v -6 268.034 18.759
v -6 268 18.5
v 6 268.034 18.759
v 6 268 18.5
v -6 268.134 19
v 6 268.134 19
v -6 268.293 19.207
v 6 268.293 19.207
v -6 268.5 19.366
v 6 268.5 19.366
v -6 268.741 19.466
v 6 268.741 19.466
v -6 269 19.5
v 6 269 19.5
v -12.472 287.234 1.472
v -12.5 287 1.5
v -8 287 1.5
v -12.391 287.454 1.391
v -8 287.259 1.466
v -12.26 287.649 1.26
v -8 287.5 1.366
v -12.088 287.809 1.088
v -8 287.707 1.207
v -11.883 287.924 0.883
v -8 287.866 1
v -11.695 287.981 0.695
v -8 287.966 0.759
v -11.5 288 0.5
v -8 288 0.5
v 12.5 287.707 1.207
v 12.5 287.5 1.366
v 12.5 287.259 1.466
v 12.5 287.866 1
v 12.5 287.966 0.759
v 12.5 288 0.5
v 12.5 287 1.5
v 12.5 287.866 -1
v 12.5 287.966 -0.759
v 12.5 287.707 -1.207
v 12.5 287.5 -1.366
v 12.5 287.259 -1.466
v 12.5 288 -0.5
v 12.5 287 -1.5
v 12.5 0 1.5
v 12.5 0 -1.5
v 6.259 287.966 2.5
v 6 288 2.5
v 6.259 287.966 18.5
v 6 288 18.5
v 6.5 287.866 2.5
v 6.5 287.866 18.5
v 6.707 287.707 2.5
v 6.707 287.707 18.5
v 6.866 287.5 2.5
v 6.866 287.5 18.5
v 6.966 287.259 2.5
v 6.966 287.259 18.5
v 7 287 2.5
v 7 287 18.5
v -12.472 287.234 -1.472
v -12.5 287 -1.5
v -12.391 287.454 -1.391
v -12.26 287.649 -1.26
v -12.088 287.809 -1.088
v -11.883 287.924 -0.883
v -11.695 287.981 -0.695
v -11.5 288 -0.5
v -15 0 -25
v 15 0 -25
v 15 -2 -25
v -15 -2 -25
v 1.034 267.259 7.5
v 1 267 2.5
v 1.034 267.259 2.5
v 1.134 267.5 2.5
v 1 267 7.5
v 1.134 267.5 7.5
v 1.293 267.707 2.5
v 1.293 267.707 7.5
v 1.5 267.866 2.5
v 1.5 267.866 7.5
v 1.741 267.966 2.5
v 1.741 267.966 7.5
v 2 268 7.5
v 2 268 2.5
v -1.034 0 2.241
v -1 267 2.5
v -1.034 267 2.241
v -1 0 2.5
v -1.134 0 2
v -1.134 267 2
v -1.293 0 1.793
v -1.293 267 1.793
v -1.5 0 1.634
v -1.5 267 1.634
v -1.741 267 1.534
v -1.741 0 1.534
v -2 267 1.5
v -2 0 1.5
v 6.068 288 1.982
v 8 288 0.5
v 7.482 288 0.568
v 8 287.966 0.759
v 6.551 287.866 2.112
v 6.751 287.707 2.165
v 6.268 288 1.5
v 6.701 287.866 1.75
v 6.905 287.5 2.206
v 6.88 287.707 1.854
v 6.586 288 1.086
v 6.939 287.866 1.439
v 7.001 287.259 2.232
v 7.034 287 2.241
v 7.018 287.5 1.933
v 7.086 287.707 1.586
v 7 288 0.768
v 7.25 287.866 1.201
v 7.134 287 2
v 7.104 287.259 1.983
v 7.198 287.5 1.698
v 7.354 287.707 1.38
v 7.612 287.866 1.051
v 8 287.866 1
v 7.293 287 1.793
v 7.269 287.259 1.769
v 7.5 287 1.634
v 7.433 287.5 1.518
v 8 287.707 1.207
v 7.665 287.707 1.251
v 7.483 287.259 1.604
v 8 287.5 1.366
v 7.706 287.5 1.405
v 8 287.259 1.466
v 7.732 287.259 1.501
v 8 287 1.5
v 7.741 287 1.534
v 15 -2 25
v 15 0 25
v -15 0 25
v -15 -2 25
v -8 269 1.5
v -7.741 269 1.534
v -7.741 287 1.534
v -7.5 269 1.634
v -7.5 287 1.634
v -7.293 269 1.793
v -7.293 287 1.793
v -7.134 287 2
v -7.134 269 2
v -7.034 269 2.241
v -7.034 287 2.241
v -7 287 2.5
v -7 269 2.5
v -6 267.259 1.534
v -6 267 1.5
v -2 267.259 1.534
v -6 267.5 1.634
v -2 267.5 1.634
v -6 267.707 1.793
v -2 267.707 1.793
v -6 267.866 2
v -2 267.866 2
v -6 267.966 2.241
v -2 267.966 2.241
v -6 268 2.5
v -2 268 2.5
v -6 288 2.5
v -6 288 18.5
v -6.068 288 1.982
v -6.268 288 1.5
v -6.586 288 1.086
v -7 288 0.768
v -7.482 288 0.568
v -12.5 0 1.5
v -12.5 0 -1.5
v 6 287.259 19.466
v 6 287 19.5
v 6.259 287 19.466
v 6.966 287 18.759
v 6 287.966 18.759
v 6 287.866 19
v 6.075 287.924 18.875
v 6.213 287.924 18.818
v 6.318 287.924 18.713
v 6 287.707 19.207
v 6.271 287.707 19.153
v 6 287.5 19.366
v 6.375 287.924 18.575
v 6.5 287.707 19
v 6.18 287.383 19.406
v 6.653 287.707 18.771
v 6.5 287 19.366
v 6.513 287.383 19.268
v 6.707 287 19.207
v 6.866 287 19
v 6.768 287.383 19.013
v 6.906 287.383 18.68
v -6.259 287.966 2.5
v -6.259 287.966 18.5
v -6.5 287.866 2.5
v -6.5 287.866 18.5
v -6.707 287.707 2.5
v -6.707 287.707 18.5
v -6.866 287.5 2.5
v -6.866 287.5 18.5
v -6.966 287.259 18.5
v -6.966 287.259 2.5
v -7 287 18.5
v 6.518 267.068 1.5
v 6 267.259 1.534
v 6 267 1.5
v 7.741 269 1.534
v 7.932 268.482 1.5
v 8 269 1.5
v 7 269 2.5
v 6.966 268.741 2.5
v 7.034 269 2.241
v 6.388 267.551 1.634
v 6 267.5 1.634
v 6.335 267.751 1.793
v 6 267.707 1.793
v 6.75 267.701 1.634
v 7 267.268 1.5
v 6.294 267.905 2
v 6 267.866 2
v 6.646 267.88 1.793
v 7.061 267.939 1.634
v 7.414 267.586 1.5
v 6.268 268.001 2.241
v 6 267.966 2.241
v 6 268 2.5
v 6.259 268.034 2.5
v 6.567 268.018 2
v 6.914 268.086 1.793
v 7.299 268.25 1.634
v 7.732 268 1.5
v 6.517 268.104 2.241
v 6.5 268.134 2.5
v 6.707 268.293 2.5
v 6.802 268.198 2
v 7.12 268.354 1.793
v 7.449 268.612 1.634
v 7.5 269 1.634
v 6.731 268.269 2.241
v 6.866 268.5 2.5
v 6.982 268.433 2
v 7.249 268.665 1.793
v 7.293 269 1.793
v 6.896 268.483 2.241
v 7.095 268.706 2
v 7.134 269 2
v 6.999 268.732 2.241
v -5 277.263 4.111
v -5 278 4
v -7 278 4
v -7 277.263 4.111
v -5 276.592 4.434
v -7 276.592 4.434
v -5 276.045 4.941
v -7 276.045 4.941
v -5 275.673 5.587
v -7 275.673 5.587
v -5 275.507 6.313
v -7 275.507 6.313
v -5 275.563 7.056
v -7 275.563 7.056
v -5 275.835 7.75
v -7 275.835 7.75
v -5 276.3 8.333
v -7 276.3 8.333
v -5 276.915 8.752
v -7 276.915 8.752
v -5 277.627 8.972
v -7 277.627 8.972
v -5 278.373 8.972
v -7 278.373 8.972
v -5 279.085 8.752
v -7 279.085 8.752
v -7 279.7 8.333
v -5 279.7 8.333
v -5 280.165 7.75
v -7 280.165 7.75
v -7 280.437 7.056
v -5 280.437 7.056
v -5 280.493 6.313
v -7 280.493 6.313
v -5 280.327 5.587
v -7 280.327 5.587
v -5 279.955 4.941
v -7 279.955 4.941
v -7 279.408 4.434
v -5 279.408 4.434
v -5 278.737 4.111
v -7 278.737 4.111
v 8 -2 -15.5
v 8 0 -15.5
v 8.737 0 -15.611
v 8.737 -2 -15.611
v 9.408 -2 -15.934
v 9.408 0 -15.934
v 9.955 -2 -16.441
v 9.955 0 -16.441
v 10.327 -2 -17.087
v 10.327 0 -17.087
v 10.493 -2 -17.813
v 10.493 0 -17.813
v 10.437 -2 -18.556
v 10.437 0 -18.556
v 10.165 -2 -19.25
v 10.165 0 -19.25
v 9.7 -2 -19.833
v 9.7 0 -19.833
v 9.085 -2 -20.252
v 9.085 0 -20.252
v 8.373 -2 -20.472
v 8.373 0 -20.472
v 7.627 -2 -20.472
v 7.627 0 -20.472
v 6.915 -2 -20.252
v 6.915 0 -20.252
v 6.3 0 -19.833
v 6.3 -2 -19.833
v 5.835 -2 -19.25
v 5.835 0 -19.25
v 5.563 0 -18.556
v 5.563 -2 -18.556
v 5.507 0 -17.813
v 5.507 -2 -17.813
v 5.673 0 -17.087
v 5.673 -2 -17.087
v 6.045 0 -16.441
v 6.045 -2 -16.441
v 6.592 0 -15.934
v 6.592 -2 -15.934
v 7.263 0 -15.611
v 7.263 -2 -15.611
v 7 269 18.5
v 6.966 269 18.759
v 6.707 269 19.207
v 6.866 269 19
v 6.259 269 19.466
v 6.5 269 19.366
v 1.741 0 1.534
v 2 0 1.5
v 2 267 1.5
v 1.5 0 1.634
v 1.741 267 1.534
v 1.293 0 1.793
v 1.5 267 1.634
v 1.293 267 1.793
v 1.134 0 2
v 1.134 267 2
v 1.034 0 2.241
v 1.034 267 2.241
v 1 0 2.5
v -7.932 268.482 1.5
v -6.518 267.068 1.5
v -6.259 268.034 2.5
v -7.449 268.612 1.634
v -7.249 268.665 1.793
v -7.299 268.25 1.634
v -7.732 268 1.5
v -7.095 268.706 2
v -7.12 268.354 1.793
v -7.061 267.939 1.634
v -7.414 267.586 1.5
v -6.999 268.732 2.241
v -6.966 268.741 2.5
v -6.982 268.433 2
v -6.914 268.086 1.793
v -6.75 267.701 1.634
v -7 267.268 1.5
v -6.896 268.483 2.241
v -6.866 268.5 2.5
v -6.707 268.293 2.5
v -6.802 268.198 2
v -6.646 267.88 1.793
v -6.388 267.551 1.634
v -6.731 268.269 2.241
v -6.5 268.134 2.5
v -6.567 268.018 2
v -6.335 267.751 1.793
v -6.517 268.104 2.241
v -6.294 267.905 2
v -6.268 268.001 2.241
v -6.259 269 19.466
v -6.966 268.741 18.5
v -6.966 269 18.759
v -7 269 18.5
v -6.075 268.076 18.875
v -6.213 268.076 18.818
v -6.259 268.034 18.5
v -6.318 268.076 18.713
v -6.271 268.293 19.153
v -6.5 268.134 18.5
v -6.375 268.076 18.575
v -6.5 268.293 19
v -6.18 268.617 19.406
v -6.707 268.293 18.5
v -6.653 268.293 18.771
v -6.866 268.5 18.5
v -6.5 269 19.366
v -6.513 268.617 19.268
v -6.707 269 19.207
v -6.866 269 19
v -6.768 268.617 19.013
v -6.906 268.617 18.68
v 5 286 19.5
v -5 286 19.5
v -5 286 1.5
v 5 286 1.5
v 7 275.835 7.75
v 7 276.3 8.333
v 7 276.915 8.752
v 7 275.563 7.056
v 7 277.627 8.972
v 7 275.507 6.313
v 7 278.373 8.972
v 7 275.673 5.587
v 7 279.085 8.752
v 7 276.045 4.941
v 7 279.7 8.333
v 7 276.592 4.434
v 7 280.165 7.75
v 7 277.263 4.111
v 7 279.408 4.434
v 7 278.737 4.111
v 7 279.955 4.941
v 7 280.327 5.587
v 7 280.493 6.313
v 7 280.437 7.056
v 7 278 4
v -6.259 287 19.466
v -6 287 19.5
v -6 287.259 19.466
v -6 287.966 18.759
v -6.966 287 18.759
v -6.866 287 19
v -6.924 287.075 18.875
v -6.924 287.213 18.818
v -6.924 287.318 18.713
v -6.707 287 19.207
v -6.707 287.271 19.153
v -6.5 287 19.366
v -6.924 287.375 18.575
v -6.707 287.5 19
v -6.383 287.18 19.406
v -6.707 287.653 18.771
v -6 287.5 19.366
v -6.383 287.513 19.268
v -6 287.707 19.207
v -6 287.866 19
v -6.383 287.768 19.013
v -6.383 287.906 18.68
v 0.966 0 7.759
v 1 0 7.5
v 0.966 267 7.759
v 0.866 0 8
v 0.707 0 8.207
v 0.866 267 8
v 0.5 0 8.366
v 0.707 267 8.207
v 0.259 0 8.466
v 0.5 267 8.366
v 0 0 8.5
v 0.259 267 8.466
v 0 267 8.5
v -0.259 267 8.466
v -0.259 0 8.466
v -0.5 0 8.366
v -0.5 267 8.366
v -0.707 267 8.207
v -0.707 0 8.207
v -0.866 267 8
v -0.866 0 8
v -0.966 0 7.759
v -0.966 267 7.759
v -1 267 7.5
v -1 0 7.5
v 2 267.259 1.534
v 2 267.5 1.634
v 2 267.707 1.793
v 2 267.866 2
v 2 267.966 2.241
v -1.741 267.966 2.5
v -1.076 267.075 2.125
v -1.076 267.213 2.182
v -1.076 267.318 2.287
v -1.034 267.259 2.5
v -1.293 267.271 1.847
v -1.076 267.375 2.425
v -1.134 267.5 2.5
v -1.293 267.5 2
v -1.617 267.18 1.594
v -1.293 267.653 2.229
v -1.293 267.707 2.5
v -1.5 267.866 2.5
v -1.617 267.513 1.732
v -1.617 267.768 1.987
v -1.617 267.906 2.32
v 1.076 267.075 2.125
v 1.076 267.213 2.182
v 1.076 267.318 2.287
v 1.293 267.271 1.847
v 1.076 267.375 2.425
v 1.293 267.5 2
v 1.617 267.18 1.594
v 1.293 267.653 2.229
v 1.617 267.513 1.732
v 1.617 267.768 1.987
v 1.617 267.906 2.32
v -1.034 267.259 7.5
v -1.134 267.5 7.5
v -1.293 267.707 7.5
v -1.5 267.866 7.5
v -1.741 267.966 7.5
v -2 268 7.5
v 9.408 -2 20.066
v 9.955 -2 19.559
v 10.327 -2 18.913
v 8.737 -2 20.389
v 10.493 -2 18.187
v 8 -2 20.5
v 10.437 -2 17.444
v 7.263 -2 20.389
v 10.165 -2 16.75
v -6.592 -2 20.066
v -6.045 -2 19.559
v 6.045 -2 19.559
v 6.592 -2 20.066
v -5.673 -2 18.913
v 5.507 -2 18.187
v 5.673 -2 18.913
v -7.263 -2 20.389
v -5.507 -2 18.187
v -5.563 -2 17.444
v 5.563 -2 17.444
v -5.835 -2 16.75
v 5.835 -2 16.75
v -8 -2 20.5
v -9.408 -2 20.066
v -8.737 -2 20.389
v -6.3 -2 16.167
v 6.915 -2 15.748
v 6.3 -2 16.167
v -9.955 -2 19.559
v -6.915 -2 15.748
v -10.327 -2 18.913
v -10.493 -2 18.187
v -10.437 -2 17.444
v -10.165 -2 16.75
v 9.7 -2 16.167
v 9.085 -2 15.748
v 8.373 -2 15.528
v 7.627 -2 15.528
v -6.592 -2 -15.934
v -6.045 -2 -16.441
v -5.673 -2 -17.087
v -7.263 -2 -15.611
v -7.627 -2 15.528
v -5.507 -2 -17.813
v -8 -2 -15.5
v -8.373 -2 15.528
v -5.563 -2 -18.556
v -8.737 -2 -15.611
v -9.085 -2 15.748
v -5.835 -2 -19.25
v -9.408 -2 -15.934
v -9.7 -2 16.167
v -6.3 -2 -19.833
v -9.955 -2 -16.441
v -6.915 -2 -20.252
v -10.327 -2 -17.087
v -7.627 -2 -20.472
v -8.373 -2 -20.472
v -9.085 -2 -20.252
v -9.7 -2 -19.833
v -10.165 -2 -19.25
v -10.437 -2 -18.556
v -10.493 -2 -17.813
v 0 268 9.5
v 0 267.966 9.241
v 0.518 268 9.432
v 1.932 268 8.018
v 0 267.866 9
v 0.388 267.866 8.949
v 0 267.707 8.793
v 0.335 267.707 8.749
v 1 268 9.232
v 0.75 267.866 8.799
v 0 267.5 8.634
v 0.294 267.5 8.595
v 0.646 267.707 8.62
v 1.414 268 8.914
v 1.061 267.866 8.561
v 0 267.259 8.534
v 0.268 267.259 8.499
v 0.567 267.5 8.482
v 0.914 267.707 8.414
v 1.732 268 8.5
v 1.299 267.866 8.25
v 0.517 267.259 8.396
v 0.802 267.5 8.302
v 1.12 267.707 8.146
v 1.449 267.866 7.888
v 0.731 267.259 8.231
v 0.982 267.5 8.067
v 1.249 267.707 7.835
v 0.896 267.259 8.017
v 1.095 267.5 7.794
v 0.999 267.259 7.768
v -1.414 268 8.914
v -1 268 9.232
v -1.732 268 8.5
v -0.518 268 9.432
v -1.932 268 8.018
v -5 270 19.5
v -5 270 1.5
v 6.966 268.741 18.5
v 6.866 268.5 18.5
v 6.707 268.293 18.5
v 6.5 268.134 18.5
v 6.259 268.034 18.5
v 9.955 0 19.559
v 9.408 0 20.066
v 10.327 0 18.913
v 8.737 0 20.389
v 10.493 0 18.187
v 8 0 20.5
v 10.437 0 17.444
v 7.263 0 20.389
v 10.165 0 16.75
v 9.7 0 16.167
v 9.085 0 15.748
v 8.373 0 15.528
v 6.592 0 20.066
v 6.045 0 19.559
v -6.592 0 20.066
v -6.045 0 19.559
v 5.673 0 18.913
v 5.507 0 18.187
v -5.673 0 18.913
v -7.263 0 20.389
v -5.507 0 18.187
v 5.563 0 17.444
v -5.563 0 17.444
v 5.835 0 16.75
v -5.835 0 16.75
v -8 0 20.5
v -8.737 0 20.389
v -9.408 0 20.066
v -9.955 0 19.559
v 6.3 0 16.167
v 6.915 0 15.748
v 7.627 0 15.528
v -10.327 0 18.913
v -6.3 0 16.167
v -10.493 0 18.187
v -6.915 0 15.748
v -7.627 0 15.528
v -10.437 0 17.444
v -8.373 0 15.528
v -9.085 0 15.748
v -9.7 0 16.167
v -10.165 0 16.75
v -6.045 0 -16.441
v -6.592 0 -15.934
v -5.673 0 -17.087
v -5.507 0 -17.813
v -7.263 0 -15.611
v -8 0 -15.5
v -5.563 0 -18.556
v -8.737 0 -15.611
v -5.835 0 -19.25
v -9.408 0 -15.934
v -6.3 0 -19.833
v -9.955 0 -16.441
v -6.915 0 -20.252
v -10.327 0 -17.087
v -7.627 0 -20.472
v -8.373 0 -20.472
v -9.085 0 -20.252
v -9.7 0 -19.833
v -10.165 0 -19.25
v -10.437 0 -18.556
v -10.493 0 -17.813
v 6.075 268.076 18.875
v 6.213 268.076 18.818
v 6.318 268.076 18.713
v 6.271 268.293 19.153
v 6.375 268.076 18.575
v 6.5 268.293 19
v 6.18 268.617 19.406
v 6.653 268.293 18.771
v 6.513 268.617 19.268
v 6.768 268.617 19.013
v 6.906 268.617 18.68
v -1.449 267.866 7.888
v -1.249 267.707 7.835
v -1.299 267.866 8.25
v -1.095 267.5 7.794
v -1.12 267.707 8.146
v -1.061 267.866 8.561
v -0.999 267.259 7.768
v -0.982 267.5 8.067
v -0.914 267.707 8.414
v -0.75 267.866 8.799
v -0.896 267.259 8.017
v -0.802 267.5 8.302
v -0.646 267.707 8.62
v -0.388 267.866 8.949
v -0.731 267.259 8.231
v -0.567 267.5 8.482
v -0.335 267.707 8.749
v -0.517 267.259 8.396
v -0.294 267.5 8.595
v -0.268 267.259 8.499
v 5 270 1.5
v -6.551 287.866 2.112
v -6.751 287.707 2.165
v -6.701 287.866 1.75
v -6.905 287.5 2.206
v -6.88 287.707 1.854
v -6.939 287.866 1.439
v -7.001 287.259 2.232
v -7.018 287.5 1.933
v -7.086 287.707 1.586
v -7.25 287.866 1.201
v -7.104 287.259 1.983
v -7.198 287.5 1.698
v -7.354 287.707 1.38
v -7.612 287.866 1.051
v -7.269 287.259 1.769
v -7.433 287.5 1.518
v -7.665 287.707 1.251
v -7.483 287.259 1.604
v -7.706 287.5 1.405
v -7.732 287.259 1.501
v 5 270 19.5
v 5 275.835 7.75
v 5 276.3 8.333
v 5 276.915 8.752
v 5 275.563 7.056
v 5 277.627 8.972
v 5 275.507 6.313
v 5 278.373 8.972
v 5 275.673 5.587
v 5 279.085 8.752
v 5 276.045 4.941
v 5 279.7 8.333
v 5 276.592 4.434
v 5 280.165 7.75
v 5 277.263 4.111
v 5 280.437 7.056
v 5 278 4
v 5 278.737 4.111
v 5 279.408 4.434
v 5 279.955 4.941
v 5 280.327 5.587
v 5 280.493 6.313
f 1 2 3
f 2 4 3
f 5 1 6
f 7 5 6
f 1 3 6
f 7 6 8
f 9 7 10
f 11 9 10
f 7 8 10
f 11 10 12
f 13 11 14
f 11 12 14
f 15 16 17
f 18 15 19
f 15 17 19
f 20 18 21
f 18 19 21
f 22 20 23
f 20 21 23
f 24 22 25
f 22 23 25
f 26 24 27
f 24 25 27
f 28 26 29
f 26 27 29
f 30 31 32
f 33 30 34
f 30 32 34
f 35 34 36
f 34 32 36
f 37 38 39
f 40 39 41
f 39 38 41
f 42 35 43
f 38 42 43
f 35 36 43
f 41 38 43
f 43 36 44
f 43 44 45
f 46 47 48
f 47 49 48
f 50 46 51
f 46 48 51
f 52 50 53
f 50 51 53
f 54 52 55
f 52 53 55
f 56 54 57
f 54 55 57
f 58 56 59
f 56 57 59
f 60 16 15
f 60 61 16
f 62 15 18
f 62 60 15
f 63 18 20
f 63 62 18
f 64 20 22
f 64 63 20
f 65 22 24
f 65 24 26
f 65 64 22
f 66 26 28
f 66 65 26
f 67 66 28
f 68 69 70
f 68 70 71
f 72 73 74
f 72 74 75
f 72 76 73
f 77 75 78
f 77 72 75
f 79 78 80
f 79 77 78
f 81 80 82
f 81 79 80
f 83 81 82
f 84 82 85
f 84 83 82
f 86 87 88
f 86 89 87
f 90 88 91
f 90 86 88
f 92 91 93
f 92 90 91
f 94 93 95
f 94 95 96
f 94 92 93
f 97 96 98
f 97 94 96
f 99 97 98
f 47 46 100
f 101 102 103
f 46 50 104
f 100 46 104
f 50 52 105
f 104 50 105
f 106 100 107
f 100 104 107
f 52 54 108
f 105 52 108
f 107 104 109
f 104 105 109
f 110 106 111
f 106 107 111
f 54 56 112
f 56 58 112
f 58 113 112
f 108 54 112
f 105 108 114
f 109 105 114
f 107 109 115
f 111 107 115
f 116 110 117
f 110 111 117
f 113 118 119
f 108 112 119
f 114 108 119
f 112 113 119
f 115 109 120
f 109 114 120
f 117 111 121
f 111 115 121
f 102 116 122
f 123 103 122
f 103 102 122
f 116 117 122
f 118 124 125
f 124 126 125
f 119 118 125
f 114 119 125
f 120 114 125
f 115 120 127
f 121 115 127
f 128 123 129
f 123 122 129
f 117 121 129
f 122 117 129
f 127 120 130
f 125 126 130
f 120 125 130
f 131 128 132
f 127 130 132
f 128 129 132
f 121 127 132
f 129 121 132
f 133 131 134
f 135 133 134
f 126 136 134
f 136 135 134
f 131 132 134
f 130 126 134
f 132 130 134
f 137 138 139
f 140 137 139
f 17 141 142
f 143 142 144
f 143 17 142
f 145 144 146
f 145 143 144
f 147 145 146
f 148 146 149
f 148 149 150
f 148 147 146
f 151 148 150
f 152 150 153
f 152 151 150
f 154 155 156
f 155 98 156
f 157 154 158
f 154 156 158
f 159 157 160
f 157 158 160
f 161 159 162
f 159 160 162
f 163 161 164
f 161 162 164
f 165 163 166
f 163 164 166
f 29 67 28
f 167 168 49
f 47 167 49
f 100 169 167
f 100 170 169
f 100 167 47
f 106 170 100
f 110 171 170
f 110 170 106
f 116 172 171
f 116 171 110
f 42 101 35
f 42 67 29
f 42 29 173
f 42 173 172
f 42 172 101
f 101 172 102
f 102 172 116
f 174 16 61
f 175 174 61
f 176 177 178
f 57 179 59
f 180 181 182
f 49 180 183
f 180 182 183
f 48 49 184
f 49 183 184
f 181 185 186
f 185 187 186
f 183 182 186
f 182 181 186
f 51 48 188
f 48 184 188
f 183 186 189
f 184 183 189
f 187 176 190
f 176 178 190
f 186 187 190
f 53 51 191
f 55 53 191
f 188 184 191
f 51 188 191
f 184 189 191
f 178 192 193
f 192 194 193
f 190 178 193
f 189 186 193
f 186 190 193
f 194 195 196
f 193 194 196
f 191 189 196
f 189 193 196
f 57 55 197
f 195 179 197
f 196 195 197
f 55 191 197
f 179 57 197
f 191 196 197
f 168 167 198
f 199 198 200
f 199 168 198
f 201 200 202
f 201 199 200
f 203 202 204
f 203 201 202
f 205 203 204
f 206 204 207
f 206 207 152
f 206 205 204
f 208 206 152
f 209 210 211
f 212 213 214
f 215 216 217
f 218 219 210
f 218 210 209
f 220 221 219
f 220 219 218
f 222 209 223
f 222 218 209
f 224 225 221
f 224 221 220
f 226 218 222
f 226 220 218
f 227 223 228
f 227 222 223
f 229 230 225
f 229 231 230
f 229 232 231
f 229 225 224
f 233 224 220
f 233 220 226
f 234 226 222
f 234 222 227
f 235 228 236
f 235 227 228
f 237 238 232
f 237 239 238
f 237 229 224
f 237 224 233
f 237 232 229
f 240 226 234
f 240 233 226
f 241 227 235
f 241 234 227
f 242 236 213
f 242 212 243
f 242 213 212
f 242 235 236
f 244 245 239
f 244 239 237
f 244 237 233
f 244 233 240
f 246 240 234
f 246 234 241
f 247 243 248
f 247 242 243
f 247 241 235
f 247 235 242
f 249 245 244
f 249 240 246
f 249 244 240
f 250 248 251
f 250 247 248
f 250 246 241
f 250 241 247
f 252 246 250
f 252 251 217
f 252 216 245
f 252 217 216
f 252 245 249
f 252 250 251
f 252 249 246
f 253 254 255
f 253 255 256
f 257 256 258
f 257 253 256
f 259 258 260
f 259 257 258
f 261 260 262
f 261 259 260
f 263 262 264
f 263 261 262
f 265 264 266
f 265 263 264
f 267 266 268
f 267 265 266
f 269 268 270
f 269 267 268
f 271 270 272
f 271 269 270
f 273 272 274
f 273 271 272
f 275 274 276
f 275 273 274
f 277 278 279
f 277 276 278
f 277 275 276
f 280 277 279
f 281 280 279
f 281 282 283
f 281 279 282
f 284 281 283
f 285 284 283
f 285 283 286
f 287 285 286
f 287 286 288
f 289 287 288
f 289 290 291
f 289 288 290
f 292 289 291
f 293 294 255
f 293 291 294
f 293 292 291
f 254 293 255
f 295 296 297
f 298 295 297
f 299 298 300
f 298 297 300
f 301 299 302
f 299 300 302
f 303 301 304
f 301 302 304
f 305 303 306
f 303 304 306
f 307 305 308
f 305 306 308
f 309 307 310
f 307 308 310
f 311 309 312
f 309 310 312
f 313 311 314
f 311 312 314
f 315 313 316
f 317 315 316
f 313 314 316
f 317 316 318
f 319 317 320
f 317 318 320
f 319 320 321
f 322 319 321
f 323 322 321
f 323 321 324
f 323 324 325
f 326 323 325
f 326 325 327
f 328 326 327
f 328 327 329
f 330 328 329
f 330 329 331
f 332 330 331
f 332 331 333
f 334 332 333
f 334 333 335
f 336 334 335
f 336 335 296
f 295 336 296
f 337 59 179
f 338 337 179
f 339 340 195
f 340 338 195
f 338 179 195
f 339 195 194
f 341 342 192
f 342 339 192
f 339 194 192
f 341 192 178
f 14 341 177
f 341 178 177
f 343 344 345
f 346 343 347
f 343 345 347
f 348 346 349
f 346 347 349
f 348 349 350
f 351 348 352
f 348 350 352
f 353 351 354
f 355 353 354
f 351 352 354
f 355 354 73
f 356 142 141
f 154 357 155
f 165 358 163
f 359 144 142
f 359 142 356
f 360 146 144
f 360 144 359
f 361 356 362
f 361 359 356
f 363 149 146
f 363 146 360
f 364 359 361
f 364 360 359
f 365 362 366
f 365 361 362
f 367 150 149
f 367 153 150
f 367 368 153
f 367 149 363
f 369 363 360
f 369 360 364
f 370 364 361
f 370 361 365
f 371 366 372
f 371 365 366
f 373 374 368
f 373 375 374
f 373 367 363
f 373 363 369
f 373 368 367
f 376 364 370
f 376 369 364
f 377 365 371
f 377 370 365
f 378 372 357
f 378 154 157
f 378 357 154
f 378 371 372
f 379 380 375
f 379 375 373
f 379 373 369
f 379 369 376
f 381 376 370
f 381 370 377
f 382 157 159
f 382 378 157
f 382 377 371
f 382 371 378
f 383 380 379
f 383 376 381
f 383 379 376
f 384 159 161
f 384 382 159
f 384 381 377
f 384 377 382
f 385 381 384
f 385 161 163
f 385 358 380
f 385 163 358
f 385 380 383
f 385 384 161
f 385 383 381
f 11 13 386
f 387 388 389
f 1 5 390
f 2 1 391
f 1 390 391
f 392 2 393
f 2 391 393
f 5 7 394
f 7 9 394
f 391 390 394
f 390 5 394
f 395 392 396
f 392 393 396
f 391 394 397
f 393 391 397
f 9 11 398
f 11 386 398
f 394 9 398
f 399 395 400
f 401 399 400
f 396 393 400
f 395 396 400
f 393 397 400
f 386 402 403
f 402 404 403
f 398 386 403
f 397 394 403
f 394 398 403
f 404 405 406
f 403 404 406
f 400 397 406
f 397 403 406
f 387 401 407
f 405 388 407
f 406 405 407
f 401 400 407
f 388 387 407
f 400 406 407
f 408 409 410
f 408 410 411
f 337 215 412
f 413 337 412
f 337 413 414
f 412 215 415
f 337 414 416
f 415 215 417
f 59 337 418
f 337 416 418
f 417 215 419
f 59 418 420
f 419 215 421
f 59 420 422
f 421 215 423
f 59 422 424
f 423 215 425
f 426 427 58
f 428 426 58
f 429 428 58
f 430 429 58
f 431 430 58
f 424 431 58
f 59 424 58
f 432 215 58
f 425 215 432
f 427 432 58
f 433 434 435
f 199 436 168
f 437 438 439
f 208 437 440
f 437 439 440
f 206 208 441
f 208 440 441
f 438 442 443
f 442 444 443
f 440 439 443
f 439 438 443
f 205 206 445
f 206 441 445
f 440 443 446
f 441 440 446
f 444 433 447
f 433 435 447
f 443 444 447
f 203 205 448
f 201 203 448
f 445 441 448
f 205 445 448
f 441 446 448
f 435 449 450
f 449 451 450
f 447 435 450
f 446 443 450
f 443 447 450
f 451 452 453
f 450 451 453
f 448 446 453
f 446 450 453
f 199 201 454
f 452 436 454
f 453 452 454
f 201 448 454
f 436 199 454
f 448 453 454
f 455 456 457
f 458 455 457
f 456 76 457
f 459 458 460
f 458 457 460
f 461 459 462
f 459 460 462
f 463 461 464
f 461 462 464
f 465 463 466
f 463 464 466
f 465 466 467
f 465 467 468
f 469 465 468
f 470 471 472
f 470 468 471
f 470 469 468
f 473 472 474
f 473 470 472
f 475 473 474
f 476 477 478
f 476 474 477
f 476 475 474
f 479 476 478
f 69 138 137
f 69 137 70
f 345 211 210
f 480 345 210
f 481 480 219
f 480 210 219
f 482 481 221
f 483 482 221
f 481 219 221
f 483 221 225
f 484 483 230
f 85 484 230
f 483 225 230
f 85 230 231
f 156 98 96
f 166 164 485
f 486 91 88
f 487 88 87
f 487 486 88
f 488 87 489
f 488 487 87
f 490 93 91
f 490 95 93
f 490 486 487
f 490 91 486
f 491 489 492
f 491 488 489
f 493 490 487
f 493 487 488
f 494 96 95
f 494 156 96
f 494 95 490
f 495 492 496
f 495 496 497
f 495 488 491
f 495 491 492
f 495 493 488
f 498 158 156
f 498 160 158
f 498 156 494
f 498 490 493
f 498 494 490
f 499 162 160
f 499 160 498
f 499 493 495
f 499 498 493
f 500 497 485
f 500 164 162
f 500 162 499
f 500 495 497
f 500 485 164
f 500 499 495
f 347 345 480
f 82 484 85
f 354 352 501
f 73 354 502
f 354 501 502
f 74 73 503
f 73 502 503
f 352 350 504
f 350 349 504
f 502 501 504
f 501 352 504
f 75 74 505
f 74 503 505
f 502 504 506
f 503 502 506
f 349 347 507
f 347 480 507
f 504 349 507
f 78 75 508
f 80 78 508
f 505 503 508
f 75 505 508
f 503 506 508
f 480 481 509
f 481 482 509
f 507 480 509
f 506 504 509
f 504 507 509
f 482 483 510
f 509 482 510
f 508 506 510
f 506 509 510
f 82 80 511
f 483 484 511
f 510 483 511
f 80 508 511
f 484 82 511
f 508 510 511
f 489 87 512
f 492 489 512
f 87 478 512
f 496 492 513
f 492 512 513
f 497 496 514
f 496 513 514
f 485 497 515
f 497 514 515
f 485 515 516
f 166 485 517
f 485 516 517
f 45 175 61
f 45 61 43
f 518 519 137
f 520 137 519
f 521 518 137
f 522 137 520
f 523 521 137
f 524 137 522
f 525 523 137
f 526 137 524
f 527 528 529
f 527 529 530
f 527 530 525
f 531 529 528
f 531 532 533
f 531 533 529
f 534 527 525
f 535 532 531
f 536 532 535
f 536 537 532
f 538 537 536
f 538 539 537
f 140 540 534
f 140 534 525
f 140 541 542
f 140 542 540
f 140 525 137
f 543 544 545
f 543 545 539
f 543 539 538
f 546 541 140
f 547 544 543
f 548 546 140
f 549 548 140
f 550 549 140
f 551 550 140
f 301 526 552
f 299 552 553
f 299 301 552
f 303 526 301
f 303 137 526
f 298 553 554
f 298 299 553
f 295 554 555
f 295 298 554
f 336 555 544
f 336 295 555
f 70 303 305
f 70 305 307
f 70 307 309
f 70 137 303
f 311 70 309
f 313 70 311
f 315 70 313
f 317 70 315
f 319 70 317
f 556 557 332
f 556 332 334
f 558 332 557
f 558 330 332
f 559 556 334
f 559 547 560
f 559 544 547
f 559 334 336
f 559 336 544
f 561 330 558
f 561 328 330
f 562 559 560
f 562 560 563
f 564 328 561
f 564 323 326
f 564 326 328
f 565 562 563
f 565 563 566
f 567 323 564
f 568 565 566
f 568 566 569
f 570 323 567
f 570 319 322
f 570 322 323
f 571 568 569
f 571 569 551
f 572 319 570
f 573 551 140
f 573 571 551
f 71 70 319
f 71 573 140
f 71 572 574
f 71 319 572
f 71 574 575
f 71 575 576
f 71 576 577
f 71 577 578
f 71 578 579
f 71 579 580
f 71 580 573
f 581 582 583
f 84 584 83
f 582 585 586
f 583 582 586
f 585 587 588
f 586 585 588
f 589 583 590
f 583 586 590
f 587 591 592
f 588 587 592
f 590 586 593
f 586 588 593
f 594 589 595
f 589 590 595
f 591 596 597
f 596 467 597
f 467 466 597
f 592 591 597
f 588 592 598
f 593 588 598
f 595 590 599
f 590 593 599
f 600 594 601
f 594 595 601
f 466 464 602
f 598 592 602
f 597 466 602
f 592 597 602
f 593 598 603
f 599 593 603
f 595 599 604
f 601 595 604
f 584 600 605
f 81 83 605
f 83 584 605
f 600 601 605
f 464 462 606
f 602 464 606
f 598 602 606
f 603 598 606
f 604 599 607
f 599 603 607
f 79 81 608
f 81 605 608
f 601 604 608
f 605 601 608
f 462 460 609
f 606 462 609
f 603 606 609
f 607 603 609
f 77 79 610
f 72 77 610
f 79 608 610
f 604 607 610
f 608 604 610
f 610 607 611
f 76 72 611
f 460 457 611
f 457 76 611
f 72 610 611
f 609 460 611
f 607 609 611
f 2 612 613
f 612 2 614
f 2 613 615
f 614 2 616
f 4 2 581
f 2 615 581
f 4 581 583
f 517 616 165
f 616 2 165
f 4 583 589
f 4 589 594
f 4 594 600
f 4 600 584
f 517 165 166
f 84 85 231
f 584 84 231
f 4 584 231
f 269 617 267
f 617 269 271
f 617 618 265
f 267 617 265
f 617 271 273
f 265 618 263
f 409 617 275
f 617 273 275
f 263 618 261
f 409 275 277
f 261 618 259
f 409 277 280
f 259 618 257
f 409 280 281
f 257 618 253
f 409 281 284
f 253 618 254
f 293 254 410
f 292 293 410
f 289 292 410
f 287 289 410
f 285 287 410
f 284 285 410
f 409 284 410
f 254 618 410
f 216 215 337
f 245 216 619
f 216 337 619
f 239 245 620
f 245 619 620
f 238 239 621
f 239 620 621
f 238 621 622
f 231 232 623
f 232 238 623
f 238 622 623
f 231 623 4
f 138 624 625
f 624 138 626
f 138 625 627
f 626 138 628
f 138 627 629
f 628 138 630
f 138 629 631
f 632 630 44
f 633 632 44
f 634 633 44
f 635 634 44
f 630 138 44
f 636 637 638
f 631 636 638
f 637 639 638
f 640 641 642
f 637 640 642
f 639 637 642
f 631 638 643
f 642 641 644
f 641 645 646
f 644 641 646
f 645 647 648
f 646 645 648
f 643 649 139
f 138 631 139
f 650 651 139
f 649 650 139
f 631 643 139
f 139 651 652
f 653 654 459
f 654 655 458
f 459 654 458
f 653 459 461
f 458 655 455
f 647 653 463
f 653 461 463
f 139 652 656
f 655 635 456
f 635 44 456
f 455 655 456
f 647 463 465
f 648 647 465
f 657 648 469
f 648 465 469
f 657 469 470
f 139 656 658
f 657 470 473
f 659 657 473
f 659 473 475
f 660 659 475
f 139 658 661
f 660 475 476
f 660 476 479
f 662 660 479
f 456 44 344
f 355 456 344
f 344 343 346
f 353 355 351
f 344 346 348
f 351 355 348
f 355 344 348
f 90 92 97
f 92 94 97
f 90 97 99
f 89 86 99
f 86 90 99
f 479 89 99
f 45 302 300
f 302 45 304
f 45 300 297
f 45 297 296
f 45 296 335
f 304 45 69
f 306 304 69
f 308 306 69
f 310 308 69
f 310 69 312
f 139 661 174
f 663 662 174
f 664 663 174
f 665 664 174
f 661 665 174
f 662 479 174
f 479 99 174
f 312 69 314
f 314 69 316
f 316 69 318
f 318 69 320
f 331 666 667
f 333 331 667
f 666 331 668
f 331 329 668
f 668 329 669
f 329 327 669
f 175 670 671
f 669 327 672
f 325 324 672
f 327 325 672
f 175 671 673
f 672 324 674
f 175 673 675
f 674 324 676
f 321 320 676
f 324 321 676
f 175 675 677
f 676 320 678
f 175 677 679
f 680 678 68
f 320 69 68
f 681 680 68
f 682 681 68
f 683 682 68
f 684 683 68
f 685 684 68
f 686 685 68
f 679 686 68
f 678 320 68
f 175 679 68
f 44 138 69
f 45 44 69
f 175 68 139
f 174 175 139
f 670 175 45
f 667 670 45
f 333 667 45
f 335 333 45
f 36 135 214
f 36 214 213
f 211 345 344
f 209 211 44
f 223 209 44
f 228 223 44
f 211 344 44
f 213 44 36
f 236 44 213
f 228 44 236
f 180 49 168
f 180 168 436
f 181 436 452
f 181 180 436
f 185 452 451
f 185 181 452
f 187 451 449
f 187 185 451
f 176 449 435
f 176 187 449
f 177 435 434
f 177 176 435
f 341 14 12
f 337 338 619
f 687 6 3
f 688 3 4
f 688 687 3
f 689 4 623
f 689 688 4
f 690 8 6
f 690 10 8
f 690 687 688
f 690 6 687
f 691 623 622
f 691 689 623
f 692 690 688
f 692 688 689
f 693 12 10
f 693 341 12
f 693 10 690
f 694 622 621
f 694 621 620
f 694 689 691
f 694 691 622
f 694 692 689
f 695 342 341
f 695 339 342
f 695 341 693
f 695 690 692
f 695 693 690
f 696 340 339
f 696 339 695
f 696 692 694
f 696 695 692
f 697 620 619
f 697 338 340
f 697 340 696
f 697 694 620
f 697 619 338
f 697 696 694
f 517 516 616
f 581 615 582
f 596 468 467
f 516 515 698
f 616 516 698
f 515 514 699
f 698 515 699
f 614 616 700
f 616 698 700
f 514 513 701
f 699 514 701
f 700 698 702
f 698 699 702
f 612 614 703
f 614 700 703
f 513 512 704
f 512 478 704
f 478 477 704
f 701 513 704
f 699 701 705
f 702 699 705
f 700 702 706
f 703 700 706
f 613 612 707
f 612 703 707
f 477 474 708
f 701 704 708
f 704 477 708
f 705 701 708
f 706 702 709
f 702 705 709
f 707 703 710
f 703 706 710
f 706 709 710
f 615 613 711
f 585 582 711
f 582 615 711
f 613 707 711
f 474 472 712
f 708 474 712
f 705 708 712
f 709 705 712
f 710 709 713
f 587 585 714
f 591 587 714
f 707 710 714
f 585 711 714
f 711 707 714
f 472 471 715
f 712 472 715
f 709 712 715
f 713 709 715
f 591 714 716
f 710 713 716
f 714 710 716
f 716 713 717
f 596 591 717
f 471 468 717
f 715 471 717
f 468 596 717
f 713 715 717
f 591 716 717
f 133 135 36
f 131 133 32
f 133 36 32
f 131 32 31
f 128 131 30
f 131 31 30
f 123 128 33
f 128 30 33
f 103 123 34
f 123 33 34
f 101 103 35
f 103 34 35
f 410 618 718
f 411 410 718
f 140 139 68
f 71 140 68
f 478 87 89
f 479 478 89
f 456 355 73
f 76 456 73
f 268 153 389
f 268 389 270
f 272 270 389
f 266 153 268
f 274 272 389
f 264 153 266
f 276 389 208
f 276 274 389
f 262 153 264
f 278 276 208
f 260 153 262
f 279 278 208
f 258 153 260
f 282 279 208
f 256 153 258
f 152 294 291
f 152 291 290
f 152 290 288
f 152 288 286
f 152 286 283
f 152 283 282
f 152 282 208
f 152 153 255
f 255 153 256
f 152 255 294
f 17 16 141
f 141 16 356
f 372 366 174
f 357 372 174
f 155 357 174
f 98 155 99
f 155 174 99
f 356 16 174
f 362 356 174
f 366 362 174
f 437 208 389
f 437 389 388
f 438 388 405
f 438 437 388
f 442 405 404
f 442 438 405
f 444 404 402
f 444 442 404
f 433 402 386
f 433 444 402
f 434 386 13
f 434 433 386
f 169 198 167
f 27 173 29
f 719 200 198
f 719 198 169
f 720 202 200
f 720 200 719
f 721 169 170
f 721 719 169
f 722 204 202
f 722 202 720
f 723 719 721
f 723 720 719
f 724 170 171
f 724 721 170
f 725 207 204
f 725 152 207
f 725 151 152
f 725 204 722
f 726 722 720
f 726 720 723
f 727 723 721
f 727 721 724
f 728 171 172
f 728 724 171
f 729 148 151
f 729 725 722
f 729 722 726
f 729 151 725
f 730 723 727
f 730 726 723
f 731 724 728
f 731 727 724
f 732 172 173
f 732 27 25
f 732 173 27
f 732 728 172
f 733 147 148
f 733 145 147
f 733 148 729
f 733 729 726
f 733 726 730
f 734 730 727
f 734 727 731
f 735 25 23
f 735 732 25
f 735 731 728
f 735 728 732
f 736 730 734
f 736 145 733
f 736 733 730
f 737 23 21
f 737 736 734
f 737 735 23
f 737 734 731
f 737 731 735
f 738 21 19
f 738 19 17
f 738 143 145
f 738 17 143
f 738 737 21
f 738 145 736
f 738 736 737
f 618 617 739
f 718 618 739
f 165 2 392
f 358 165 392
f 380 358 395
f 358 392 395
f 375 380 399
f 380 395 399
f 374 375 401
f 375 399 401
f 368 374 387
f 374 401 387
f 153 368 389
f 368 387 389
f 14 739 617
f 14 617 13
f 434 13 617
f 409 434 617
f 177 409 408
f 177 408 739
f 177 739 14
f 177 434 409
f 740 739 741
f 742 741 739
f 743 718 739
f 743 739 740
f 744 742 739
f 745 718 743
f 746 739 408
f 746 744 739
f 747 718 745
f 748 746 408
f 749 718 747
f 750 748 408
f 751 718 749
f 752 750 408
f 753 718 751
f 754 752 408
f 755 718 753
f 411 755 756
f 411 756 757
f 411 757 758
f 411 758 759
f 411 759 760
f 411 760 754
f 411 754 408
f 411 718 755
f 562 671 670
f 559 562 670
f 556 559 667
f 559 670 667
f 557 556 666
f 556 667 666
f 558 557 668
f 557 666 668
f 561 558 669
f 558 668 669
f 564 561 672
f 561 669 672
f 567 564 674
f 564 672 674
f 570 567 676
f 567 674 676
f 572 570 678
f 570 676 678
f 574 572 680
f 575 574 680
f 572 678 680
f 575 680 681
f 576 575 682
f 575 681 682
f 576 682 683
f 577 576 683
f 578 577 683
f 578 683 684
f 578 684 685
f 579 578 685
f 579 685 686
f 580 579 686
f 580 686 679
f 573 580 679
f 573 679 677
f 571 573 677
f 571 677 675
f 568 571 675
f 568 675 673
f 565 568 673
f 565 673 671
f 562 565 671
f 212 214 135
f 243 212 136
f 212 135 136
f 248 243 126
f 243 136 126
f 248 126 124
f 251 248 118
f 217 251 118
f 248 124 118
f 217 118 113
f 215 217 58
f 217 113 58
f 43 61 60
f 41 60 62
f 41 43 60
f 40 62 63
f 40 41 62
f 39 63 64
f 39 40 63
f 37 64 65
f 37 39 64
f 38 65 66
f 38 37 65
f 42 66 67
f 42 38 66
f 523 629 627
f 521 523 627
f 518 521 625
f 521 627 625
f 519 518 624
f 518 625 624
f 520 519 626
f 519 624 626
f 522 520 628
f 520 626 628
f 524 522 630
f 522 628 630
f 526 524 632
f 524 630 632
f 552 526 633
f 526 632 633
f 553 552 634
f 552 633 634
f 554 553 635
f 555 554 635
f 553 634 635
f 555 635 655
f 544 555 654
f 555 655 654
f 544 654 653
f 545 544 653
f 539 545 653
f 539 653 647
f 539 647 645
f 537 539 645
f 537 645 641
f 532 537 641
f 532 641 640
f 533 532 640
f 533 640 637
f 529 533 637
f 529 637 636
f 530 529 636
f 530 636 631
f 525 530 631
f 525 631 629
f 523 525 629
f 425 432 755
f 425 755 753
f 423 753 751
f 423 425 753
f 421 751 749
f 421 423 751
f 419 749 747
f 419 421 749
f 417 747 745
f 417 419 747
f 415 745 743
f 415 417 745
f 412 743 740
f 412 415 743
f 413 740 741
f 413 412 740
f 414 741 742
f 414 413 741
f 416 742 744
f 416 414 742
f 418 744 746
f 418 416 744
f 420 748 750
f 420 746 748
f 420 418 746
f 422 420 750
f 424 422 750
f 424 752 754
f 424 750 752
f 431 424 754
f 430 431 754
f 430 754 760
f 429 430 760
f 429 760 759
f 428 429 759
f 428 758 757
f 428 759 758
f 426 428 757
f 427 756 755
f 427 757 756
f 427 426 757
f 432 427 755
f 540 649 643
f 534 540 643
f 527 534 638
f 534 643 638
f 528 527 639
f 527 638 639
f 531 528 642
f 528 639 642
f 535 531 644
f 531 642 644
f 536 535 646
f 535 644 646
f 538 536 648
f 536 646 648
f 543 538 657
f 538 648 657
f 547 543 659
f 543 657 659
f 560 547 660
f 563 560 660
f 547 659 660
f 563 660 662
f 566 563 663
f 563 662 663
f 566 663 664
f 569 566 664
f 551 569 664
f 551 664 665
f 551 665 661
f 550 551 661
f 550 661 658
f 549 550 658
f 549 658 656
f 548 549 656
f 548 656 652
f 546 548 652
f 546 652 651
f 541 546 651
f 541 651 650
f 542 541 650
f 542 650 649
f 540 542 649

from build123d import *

# Parameters (mm, degrees)
SKETCH1_W               = 25
SKETCH1_H               = 3
BOSS_EXTRUDE1_DEPTH     = 288
SKETCH2_W               = 14
SKETCH2_H               = 20
SKETCH2_W_2             = 10
SKETCH2_H_2             = 16
BOSS_EXTRUDE2_DEPTH     = 18
CUT_EXTRUDE1_DEPTH      = 290.317299863
CUT_EXTRUDE1_DEPTH_BACK = 290.317299863
SKETCH3_R               = 2.5
SKETCH4_W               = 30
SKETCH4_H               = 50
BOSS_EXTRUDE3_DEPTH     = 2
BOSS_EXTRUDE4_DEPTH     = 7
FILLET1_R               = 1
SKETCH6_R               = 2.5
CUT_EXTRUDE2_DEPTH      = 10


with BuildPart() as part:
    # Sketch1 → Boss-Extrude1 (new body)
    with BuildSketch(Plane(origin=(0, 0, 0), x_dir=(1, 0, 0), z_dir=(0, 1, 0))):
        Rectangle(SKETCH1_W, SKETCH1_H)
    extrude(amount=BOSS_EXTRUDE1_DEPTH)

    # Sketch2 → Boss-Extrude2 (add)
    with BuildSketch(Plane.XY.offset(1.5)):
        with Locations((0, 278)):
            Rectangle(SKETCH2_W, SKETCH2_H)
        with Locations((0, 278)):
            Rectangle(SKETCH2_W_2, SKETCH2_H_2, mode=Mode.SUBTRACT)
    extrude(amount=BOSS_EXTRUDE2_DEPTH)

    # Sketch3 → Cut-Extrude1 (cut, two sides: drawn at the far end of the back side and taken through both)
    with BuildSketch(Plane.ZY.offset(7).offset(-CUT_EXTRUDE1_DEPTH_BACK)):
        with Locations(Location((6.5, 278, 0), (0, 0, 180))):
            Circle(SKETCH3_R)
    extrude(amount=CUT_EXTRUDE1_DEPTH + CUT_EXTRUDE1_DEPTH_BACK, mode=Mode.SUBTRACT)

    # Sketch4 → Boss-Extrude3 (add)
    with BuildSketch(Plane(origin=(0, 0, 0), x_dir=(-1, 0, 0), z_dir=(0, -1, 0))):
        Rectangle(SKETCH4_W, SKETCH4_H)
    extrude(amount=BOSS_EXTRUDE3_DEPTH)

    # Sketch5 → Boss-Extrude4 (add)
    with BuildSketch(Plane.XY.offset(1.5)):
        Polygon((0, 0), (1, 0), (1, 268), (0, 268), (-1, 268), (-1, 0), align=None)
    extrude(amount=BOSS_EXTRUDE4_DEPTH)

    # Fillet1
    fillet1_edges = [part.edges().sort_by_distance(p)[0] for p in [
        (-12.5, 288, 0),
        (9.75, 288, 1.5),
        (-9.75, 288, 1.5),
        (7, 278, 19.5),
        (0, 288, 19.5),
        (-7, 278, 19.5),
        (0, 268, 19.5),
        (7, 278, 1.5),
        (7, 268, 10.5),
        (7, 288, 10.5),
        (-7, 278, 1.5),
        (-7, 288, 10.5),
        (-4, 268, 1.5),
        (-7, 268, 10.5),
        (4, 268, 1.5),
        (1, 134, 1.5),
        (1, 268, 5),
        (-1, 134, 1.5),
        (-1, 268, 5),
        (1, 134, 8.5),
        (0, 268, 8.5),
        (-1, 134, 8.5),
        (0, 288, -1.5),
    ]]
    fillet(fillet1_edges, radius=FILLET1_R - 0.0001)  # a hair under: the kernel refuses the full size

    # Sketch6 → Cut-Extrude2 (cut)
    with BuildSketch(Plane(origin=(0, 0, 0), x_dir=(1, 0, 0), z_dir=(0, 1, 0))):
        with Locations(Location((8, 18, 0), (0, 0, 270))):
            Circle(SKETCH6_R)
        with Locations(Location((-8, 18, 0), (0, 0, 270))):
            Circle(SKETCH6_R)
        with Locations(Location((-8, -18, 0), (0, 0, 270))):
            Circle(SKETCH6_R)
        with Locations(Location((8, -18, 0), (0, 0, 270))):
            Circle(SKETCH6_R)
    extrude(amount=-CUT_EXTRUDE2_DEPTH, mode=Mode.SUBTRACT)


solid = part.part
